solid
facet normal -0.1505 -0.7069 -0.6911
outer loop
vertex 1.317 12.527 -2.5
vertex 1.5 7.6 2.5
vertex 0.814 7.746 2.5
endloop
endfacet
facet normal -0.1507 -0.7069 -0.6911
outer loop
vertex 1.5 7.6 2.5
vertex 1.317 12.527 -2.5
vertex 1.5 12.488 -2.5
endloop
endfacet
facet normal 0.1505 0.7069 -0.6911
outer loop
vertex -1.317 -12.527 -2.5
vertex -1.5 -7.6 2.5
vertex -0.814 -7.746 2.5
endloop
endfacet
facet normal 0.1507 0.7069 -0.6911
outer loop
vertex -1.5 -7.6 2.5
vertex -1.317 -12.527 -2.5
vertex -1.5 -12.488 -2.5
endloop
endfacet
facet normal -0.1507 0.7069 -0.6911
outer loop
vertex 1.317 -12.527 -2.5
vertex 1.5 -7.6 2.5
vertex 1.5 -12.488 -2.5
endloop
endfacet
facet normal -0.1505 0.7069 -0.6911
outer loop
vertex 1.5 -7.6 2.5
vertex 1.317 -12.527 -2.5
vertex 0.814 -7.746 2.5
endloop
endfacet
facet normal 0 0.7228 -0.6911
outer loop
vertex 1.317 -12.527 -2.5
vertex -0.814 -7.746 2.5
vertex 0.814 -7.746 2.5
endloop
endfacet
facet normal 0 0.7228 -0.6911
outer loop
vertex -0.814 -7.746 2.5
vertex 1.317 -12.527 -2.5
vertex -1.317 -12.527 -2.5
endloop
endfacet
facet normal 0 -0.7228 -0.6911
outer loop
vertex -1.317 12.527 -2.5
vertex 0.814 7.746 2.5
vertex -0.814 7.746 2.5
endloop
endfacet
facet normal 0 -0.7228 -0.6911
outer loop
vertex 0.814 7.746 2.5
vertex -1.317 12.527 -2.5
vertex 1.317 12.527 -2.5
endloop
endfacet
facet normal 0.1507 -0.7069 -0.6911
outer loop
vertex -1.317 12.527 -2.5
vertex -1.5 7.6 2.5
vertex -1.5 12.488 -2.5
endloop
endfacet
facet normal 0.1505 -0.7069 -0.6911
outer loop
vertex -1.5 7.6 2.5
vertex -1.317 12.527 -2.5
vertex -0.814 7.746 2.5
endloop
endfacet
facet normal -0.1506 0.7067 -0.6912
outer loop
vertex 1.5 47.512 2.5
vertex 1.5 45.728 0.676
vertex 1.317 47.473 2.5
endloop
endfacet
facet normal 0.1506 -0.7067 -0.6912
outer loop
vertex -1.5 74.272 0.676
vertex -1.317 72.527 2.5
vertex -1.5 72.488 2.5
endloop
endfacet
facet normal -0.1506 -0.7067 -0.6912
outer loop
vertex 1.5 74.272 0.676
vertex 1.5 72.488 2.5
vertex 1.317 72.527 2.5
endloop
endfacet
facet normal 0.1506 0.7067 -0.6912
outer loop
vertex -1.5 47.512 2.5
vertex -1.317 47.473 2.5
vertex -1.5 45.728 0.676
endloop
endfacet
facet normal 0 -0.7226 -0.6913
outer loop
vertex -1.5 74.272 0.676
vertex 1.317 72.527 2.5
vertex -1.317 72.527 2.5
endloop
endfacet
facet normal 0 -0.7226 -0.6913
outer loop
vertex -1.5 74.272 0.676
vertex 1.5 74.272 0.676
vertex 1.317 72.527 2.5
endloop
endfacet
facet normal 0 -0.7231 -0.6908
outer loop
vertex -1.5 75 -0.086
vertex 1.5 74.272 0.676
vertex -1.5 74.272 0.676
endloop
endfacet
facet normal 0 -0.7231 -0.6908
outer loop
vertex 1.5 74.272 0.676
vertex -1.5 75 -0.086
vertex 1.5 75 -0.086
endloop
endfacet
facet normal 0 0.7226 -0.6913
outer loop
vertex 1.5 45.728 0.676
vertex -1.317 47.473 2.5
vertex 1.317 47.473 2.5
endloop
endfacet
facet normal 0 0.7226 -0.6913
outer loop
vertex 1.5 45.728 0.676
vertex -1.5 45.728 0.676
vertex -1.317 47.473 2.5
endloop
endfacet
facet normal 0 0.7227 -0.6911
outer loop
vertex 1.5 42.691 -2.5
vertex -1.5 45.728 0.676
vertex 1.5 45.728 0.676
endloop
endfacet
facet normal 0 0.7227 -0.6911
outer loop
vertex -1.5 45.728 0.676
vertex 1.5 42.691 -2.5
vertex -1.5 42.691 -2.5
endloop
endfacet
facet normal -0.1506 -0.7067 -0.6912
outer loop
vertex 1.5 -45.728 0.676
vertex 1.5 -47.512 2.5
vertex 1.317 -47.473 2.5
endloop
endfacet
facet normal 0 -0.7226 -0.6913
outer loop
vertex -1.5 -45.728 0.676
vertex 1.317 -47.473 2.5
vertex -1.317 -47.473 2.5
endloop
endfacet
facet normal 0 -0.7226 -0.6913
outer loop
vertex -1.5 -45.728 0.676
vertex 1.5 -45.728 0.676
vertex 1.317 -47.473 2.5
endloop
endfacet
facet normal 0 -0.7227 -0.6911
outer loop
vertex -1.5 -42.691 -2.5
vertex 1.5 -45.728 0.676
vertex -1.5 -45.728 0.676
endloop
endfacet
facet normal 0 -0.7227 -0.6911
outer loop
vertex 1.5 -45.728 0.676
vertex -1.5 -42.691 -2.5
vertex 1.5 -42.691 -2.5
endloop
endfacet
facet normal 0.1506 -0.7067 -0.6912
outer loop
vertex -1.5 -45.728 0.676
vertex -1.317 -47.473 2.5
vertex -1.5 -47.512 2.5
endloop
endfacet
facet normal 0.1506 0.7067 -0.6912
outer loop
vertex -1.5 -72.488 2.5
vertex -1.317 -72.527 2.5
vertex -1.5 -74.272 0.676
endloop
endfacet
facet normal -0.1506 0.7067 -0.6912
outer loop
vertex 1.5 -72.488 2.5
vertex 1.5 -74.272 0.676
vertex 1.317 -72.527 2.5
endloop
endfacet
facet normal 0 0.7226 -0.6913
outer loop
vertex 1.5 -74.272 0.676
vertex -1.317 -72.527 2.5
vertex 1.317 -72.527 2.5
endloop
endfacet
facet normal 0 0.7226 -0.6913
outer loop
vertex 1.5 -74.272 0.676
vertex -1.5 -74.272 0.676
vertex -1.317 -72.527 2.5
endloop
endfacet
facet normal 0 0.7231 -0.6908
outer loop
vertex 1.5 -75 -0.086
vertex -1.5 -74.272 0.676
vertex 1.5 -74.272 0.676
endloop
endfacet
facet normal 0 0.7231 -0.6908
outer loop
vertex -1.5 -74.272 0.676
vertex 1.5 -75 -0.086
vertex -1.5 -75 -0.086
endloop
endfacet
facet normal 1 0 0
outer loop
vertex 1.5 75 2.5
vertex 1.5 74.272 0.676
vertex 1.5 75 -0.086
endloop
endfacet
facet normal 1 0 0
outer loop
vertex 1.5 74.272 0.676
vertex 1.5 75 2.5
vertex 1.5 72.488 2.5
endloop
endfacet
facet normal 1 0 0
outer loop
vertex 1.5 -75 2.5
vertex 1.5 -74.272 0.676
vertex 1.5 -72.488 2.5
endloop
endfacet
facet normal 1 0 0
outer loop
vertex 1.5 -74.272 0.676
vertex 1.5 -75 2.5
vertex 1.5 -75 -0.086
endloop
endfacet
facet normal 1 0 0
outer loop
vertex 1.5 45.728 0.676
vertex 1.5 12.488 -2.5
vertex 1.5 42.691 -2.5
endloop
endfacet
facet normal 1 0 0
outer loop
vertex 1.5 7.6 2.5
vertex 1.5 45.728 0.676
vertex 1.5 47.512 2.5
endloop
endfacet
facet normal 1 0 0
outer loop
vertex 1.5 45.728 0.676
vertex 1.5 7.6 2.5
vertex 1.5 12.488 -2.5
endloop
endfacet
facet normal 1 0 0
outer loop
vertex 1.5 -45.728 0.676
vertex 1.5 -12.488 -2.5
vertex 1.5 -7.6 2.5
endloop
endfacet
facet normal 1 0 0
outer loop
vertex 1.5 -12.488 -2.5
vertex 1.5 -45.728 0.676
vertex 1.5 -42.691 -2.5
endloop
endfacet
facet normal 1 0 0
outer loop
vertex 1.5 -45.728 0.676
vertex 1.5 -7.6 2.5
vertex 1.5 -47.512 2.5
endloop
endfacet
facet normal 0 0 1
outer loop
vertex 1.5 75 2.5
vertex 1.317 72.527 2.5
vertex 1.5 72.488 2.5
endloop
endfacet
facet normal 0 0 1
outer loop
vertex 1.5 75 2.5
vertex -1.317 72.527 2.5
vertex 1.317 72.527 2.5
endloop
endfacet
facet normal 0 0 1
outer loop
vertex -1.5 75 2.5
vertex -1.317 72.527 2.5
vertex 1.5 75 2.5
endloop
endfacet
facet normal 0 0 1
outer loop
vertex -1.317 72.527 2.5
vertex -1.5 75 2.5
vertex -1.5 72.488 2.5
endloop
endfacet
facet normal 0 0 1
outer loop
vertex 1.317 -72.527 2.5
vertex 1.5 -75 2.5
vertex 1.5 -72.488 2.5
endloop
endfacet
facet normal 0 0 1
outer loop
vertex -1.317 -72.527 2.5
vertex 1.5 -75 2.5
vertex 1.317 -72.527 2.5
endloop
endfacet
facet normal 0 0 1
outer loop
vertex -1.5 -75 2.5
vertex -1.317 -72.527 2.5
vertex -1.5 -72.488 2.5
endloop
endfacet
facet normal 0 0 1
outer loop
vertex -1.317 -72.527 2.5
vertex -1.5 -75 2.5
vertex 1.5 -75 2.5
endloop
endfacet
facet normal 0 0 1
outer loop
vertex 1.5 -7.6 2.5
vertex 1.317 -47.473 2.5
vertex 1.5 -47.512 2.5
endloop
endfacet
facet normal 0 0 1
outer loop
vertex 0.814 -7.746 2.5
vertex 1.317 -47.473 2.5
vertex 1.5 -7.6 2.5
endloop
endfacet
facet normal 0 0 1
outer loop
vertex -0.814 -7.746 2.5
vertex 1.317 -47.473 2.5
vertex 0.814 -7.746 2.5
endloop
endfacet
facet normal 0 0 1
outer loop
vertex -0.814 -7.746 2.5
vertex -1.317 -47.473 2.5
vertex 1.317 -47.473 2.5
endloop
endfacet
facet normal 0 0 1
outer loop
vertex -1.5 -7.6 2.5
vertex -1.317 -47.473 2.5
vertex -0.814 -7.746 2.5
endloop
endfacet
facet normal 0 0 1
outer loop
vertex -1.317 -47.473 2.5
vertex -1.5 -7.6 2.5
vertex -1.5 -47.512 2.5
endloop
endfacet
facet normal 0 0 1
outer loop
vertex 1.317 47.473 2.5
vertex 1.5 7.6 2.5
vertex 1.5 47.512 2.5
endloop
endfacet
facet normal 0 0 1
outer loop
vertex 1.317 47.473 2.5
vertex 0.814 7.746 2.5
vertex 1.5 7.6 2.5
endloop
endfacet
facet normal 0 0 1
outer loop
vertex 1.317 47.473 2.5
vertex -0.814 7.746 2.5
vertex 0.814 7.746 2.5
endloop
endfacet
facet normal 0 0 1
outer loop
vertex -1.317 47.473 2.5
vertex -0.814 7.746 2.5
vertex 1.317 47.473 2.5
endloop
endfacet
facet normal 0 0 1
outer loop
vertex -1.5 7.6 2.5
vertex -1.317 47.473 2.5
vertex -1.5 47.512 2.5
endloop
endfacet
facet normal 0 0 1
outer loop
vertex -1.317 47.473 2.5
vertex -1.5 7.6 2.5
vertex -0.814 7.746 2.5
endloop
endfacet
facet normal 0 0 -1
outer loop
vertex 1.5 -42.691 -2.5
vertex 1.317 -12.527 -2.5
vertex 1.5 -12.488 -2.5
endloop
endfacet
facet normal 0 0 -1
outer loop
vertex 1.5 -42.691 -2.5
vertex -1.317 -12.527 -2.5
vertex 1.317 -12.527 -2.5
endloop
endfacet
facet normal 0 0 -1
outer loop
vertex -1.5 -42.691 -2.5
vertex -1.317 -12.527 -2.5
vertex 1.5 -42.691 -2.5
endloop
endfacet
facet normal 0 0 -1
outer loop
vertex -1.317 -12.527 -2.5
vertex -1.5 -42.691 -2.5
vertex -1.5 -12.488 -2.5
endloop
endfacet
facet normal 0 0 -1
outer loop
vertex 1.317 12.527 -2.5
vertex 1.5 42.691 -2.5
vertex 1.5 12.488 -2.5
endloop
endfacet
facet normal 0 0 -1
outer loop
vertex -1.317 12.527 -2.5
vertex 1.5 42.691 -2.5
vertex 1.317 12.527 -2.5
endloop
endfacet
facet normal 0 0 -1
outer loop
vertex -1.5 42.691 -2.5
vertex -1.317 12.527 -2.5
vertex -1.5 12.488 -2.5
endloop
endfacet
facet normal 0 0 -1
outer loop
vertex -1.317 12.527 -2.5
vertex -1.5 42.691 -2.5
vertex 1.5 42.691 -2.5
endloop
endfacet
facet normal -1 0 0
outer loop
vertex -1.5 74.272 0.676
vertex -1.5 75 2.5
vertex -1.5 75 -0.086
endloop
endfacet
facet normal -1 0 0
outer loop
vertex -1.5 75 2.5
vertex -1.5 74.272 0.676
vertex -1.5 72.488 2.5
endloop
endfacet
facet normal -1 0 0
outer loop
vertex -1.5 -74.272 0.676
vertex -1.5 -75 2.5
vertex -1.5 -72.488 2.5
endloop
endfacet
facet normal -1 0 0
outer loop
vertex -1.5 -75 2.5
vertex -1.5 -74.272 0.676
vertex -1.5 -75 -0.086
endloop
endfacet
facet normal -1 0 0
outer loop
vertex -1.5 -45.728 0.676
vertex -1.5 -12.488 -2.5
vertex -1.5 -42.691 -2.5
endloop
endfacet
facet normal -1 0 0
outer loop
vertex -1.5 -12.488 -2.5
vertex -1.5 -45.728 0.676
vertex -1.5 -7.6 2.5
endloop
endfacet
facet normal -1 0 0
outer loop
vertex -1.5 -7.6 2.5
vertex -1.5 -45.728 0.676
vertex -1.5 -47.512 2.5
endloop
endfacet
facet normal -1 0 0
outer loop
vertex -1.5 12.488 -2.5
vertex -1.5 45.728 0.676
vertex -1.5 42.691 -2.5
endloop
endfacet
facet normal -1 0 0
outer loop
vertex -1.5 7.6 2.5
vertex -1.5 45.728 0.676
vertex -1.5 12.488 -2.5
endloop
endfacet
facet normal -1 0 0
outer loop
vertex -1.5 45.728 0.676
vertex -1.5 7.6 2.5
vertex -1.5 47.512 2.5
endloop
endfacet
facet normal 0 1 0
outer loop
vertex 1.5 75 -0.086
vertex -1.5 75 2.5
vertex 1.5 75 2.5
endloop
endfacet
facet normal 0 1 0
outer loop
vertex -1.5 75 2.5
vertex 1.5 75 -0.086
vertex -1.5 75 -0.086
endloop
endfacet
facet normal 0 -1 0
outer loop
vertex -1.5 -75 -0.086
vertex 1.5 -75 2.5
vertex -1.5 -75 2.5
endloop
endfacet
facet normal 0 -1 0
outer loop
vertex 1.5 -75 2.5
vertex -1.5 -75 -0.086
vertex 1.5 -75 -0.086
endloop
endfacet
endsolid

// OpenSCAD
// file: plate_twin_lasers.scad
$fn=64;

plate_debth_new = 2.8;
plate_len = 120;
plate_width = 33;

//plate(plate_debth_new);

module plate(plate_debth){
    difference(){
        base(plate_debth);
        holes();
    } 
}

module holes(){
    cylinder(h = 40, d=6.5, center = true);
    
    translate([0,-plate_len/2,0])
    cylinder(h = 40, d=6.5, center = true);
    
    translate([0,plate_len/2,0])
    cylinder(h = 40, d=6.5, center = true);
}

module base(plate_debth){
    cube([plate_width,plate_len,plate_debth], center = true);
    color("red")
    translate([0,-plate_len/2,0])
    cylinder(h=plate_debth, d=plate_width, center = true );
    color("green")
    translate([0,plate_len/2,0])
    cylinder(h=plate_debth, d=plate_width, center = true );
}
// main file
use <plate_twin_lasers.scad>
//rib(rib_debth = 3,rib_height = 15.5);

plate_debth_new = 2.8;
plate_len = 120;
plate_width = 33;

rib_center_set(rib_debth=3, rib_height=5);

module rib_center_set(rib_height, rib_debth){
    difference(){
        rib_center(rib_debth, rib_height);
        holes();
    }
}
module holes(){
    translate([0,0,-5])
    cylinder(d1=55, d2=5, h=25+1, center=true);
    
    translate([0, plate_len/2])
    cylinder(d1=55, d2=5, h=25+1, center=true);
    
    translate([0, -plate_len/2])
    cylinder(d1=55, d2=5, h=25+1, center=true);
}
module rib_center(rib_debth,rib_height){

    cube([rib_debth,,150,rib_height], center = true);
}

module rib(rib_debth,rib_height){
    difference(){
        //scale([1,1,rib_height])
        plate(plate_debth=rib_height);
        translate([0,0,0])
        //scale([1,1,rib_height])
        cube([plate_width-rib_debth,plate_len,rib_height+1], center = true);
        
        color("red")
        translate([0,-plate_len/2,0])
        //scale([1,1,rib_height])
        cylinder(h=rib_height+1, d=plate_width-rib_debth, center = true );
        
        color("green")
        translate([0,plate_len/2,0])
        //scale([1,1,rib_height])
        cylinder(h=rib_height+1, d=plate_width-rib_debth, center = true );
    }
}
